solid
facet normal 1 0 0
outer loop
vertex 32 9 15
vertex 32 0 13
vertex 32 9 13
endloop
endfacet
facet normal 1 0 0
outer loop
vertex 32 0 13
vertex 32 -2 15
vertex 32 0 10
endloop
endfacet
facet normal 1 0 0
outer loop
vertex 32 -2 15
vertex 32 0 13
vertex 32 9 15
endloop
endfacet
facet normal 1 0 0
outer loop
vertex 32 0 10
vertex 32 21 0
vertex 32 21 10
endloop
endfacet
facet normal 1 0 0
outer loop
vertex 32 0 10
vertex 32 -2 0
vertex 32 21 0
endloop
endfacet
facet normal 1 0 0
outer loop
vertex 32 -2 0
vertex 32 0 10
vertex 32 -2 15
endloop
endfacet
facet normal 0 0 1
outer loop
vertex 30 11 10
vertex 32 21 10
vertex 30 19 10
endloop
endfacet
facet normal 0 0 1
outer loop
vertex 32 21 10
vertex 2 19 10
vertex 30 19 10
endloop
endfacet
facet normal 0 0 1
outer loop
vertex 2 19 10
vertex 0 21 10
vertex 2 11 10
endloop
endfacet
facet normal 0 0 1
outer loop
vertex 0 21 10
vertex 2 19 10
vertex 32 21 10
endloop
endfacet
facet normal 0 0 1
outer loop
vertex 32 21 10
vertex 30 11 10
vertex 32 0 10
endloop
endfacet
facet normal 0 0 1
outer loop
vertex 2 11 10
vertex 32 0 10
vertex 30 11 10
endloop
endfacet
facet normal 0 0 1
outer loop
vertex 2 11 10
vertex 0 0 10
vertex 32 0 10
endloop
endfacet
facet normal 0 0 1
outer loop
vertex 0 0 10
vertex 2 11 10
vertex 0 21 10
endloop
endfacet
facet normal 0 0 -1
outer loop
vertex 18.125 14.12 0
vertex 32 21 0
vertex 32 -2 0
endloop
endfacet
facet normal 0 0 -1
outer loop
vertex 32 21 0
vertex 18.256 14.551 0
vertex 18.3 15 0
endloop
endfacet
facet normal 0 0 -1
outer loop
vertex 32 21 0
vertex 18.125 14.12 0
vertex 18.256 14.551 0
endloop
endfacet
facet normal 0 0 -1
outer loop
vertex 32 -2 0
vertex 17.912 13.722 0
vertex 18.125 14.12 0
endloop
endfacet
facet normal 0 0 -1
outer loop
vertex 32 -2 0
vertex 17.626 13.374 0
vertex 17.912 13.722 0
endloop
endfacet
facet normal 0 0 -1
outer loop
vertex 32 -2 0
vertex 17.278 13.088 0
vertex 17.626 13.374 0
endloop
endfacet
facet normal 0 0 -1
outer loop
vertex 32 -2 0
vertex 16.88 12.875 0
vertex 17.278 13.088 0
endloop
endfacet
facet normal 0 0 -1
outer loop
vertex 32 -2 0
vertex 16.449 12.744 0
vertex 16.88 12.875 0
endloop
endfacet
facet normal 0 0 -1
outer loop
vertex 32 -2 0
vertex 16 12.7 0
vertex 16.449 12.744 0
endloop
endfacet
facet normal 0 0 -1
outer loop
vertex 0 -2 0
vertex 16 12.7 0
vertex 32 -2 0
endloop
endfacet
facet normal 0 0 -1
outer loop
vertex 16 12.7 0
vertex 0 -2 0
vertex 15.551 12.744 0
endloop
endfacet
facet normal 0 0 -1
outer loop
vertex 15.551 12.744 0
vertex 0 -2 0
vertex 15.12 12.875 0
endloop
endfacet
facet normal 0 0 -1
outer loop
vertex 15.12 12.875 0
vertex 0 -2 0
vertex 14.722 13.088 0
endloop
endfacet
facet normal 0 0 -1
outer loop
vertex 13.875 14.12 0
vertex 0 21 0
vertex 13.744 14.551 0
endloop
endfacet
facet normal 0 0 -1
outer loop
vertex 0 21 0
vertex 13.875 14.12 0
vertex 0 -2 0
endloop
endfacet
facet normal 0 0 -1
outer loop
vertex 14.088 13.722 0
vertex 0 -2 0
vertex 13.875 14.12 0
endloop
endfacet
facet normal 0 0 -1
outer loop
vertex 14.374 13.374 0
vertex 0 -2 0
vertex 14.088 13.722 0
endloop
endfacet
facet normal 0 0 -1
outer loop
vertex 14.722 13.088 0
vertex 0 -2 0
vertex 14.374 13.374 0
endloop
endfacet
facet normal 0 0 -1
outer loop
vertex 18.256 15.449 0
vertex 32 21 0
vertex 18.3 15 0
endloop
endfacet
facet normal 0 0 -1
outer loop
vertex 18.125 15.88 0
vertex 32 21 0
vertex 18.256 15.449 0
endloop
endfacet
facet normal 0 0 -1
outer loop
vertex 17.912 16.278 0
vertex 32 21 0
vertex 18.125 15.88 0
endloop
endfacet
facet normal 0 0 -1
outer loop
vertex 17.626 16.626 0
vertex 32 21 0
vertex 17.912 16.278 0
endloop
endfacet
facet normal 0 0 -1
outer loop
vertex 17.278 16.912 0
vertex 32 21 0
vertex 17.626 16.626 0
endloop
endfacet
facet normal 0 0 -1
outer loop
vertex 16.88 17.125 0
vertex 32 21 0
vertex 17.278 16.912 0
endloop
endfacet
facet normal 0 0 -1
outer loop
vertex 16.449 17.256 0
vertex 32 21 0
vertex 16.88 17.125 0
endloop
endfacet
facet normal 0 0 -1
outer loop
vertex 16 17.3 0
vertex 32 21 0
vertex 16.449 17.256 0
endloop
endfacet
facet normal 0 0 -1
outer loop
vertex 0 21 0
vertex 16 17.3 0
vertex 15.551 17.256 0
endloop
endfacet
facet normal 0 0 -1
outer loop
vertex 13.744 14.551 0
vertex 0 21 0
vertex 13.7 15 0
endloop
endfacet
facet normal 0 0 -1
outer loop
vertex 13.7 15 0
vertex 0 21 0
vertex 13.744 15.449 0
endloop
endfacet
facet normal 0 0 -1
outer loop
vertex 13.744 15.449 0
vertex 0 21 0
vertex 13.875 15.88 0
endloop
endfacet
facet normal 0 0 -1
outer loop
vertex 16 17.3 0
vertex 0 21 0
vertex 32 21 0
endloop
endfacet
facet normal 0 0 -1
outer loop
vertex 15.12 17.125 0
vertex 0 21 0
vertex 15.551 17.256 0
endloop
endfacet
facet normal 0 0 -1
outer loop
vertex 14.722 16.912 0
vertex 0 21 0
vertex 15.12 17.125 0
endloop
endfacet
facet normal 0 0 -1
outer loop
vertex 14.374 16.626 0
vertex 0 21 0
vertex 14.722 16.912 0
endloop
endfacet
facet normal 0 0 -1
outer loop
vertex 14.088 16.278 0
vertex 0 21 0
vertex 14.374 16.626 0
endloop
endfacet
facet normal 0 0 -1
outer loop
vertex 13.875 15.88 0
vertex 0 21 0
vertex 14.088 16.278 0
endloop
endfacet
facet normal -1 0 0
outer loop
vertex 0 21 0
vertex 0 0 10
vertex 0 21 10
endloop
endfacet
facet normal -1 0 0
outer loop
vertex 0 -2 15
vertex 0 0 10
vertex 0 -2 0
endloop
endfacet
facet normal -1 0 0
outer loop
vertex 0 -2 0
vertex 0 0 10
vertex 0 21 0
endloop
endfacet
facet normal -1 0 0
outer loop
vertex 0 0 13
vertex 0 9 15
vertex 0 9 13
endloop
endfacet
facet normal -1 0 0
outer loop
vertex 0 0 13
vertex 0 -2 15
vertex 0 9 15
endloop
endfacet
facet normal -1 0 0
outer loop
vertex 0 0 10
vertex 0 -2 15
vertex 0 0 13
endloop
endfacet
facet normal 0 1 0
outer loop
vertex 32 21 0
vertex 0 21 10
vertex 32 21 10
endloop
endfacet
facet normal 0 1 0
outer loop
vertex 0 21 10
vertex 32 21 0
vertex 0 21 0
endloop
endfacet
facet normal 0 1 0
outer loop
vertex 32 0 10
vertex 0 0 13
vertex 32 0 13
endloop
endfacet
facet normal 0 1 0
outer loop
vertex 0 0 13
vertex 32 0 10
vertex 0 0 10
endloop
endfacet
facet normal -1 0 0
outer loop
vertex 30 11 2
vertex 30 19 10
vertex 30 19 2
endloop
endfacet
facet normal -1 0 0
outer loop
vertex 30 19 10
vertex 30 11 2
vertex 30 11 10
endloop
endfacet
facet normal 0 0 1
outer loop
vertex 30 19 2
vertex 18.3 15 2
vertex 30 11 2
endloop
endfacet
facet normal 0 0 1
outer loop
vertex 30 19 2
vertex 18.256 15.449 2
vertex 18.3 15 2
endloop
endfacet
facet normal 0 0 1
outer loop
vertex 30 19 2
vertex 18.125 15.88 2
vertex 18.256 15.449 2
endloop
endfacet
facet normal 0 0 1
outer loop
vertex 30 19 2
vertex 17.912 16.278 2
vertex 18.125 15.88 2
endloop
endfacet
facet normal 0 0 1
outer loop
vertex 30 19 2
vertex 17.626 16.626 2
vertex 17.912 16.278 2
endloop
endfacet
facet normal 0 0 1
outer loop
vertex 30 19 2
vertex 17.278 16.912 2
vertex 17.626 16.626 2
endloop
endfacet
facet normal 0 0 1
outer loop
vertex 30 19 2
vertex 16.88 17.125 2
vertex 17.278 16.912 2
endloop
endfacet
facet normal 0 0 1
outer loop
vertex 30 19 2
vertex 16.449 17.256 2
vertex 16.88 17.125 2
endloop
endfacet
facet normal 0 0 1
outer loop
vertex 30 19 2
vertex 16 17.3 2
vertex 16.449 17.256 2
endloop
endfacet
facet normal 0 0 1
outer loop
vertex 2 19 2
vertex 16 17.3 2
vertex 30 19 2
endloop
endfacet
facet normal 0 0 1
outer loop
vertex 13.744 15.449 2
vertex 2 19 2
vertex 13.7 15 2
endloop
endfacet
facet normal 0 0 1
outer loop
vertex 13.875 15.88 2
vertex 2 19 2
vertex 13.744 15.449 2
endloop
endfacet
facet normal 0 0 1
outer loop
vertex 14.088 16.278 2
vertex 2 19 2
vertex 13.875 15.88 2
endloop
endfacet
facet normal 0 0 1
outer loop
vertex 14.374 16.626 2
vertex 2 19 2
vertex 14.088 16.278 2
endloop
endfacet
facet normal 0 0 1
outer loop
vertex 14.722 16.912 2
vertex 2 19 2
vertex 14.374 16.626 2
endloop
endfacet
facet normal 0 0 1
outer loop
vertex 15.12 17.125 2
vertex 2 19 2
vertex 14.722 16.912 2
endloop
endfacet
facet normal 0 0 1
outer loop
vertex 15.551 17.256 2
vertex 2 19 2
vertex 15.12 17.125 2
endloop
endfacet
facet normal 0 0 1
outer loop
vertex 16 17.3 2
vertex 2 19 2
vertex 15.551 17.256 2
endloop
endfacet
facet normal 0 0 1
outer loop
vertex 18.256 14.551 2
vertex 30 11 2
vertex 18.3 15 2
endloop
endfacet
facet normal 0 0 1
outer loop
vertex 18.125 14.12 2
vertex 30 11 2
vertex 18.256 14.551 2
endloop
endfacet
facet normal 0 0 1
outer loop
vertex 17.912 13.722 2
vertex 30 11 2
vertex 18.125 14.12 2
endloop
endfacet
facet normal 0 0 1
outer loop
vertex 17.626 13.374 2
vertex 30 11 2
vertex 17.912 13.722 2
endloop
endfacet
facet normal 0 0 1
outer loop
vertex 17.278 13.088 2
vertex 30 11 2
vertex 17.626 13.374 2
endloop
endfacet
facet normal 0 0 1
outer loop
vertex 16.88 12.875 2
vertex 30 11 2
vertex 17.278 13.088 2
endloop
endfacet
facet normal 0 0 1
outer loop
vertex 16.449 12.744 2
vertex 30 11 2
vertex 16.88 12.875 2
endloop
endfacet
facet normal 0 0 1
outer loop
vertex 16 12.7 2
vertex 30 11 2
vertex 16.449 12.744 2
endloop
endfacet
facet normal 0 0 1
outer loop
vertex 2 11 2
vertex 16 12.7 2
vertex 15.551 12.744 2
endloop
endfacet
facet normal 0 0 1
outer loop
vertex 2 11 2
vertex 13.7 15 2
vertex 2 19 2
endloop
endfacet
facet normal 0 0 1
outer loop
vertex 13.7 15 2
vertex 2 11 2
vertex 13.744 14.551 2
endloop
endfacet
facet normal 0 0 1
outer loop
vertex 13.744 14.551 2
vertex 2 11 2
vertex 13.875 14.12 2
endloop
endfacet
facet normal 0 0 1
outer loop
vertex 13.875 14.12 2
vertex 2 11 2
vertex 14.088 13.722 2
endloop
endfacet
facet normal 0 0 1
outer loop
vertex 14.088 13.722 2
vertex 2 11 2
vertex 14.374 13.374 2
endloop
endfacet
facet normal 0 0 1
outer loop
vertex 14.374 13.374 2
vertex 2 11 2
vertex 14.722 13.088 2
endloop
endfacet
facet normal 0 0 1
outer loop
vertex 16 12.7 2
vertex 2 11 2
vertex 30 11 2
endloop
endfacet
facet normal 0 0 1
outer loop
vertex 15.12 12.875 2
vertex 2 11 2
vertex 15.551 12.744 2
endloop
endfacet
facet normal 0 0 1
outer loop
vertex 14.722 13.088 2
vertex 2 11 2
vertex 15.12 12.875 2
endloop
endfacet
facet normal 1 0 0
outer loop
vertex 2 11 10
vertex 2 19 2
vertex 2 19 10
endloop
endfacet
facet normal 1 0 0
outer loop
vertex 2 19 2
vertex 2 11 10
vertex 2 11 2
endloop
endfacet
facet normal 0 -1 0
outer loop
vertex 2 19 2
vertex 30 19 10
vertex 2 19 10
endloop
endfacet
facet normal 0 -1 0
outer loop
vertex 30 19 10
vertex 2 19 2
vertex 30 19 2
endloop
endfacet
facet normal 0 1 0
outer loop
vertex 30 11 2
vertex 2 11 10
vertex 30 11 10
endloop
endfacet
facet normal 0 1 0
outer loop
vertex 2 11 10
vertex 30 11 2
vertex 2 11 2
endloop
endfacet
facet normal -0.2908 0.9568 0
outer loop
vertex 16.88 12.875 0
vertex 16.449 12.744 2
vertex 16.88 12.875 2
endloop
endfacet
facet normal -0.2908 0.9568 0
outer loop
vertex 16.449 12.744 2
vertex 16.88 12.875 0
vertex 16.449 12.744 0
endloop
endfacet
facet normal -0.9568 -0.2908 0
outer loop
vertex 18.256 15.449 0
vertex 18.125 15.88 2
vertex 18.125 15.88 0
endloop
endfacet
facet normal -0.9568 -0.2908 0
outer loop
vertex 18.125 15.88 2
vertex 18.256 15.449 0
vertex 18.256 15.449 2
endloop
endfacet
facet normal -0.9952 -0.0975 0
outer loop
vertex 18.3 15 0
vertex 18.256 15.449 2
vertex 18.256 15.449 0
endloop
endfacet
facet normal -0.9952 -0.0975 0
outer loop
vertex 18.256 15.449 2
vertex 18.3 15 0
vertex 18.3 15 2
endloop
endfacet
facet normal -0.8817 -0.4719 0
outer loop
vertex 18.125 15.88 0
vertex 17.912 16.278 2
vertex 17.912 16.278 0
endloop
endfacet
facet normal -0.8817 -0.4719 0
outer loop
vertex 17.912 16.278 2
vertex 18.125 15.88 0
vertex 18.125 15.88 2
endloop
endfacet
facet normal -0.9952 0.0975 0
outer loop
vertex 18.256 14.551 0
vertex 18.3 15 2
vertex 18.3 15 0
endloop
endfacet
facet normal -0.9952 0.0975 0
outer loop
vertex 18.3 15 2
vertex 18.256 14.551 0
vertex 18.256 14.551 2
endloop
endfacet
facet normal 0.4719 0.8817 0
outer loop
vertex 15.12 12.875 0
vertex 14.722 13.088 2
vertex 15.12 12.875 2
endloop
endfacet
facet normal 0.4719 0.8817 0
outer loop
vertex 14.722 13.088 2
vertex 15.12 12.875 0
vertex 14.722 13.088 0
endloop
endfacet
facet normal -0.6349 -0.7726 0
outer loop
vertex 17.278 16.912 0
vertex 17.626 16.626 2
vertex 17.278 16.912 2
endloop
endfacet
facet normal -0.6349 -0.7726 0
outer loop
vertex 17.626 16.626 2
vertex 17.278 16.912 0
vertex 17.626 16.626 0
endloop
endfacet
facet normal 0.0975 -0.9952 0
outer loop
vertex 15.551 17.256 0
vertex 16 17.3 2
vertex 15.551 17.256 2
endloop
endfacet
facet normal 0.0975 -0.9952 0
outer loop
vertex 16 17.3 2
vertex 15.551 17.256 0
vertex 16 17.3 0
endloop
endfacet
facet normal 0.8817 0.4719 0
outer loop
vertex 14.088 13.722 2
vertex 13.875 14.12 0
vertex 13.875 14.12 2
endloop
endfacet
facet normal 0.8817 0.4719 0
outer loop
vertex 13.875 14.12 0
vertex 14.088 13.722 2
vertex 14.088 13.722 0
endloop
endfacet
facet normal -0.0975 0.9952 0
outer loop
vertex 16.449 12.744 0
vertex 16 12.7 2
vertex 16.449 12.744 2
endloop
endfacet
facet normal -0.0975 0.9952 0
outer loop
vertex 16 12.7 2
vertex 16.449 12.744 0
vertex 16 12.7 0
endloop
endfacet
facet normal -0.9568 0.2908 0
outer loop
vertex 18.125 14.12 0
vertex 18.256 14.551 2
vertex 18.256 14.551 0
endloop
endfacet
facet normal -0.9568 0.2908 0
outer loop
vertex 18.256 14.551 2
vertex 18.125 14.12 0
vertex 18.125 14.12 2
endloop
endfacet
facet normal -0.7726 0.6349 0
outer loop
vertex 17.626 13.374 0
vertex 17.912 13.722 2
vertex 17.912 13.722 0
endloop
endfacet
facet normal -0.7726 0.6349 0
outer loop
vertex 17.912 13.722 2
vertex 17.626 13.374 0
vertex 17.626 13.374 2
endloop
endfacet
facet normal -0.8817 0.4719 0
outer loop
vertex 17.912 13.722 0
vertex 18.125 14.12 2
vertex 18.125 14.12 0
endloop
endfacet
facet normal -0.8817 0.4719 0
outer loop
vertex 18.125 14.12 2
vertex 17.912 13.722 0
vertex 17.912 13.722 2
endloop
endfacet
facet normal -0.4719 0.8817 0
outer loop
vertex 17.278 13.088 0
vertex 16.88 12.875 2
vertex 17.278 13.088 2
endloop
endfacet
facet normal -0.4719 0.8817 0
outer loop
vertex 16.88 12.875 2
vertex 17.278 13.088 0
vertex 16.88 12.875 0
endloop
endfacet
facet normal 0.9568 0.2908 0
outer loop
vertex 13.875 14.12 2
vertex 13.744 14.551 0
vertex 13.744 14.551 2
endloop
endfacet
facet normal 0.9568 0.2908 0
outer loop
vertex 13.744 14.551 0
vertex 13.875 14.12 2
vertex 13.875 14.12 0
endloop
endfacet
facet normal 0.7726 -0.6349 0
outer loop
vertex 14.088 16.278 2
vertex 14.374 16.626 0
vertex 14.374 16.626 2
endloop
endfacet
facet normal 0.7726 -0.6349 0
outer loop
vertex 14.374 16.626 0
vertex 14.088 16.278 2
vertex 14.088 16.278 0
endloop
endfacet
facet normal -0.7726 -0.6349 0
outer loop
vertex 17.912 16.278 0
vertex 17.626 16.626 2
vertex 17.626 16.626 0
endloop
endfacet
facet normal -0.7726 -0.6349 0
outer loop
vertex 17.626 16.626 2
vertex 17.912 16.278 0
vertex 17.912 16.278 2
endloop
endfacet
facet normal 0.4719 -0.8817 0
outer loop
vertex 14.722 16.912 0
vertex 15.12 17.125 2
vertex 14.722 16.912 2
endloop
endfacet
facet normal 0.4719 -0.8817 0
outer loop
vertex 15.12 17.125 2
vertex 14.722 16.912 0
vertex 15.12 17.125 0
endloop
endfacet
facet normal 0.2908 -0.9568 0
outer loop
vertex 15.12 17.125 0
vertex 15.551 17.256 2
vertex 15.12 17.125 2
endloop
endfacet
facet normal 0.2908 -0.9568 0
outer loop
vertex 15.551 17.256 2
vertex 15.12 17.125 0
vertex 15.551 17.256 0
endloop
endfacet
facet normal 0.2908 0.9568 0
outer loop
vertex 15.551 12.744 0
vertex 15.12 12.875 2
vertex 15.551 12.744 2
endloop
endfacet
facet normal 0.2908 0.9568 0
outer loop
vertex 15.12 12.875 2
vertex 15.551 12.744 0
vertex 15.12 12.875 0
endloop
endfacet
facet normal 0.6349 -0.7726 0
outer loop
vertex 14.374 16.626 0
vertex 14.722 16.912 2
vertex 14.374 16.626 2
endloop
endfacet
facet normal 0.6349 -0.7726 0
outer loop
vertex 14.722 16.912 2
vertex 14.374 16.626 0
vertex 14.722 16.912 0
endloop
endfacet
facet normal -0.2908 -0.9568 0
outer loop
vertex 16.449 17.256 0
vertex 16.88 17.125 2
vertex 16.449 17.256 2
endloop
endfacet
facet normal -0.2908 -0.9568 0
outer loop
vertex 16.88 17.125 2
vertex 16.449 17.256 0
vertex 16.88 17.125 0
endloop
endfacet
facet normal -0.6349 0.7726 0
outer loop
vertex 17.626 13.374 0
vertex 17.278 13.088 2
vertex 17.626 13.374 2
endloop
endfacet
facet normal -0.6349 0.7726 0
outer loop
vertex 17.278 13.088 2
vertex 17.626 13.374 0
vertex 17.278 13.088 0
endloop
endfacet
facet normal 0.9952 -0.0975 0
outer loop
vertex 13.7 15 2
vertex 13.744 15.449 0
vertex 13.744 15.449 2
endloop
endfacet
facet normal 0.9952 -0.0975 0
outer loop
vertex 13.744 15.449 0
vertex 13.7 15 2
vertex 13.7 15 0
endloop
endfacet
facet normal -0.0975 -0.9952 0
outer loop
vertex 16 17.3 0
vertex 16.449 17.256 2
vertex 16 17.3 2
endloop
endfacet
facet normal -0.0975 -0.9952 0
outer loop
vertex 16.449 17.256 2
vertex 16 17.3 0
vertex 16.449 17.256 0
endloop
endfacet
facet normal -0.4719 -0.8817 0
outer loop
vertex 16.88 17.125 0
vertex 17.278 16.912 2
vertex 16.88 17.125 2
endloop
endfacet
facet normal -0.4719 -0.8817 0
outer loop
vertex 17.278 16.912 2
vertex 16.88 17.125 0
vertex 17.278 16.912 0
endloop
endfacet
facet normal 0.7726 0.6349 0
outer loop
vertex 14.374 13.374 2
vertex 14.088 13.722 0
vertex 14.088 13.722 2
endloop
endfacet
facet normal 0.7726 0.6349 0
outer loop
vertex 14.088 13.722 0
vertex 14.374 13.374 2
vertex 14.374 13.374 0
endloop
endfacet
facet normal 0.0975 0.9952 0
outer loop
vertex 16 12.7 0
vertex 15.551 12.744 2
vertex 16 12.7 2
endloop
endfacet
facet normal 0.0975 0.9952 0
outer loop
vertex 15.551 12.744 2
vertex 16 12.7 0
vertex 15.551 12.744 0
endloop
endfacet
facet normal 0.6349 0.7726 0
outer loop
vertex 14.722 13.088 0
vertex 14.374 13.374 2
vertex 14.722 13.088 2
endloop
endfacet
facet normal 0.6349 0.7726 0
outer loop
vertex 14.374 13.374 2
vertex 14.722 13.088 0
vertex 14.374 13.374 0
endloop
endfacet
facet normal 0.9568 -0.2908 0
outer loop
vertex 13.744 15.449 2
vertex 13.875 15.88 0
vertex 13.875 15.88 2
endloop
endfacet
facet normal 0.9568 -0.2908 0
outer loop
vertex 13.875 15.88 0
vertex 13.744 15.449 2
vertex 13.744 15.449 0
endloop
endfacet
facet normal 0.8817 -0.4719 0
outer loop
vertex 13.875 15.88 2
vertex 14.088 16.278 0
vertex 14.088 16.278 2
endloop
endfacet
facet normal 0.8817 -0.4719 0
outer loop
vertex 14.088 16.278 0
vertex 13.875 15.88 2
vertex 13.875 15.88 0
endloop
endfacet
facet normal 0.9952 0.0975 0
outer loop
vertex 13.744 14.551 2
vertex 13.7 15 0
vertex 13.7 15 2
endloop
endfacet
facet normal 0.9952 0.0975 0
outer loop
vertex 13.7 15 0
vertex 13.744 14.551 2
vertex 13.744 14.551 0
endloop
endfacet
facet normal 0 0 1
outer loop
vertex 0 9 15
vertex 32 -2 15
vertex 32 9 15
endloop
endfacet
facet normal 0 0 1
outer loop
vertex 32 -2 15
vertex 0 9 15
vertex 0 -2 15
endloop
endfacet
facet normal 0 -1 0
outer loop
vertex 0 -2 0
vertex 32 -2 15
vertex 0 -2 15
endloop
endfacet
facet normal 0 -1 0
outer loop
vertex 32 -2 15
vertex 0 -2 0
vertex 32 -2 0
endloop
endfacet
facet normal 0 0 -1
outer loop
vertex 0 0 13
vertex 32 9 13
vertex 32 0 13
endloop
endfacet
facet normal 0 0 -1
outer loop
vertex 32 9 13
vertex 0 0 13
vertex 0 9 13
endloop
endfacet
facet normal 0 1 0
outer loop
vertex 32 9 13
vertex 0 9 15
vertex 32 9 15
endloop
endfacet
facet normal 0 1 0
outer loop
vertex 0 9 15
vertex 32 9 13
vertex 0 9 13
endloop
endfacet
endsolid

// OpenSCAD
$fn=32;
width = 32;
thickness = 2;
box_thickness = 10;
bottom_thickness = 3;
overhang = 9;
channel_width = 12;
screw_hole_radius = 2.3;

union() {
  difference() {
    cube([width, overhang + channel_width, box_thickness]);
      
    translate([thickness, overhang + thickness, thickness])
    cube([width - 2*thickness, channel_width - 2*thickness, box_thickness]);
      
    translate([width/2, overhang + channel_width/2, -1])
    cylinder(h=thickness+2, r=screw_hole_radius);
  }
    
  translate([0, -thickness, 0])
  cube([width, thickness, box_thickness + bottom_thickness + thickness]);
   
  translate([0, 0, box_thickness + bottom_thickness])
  cube([width, overhang, thickness]);
   
}
